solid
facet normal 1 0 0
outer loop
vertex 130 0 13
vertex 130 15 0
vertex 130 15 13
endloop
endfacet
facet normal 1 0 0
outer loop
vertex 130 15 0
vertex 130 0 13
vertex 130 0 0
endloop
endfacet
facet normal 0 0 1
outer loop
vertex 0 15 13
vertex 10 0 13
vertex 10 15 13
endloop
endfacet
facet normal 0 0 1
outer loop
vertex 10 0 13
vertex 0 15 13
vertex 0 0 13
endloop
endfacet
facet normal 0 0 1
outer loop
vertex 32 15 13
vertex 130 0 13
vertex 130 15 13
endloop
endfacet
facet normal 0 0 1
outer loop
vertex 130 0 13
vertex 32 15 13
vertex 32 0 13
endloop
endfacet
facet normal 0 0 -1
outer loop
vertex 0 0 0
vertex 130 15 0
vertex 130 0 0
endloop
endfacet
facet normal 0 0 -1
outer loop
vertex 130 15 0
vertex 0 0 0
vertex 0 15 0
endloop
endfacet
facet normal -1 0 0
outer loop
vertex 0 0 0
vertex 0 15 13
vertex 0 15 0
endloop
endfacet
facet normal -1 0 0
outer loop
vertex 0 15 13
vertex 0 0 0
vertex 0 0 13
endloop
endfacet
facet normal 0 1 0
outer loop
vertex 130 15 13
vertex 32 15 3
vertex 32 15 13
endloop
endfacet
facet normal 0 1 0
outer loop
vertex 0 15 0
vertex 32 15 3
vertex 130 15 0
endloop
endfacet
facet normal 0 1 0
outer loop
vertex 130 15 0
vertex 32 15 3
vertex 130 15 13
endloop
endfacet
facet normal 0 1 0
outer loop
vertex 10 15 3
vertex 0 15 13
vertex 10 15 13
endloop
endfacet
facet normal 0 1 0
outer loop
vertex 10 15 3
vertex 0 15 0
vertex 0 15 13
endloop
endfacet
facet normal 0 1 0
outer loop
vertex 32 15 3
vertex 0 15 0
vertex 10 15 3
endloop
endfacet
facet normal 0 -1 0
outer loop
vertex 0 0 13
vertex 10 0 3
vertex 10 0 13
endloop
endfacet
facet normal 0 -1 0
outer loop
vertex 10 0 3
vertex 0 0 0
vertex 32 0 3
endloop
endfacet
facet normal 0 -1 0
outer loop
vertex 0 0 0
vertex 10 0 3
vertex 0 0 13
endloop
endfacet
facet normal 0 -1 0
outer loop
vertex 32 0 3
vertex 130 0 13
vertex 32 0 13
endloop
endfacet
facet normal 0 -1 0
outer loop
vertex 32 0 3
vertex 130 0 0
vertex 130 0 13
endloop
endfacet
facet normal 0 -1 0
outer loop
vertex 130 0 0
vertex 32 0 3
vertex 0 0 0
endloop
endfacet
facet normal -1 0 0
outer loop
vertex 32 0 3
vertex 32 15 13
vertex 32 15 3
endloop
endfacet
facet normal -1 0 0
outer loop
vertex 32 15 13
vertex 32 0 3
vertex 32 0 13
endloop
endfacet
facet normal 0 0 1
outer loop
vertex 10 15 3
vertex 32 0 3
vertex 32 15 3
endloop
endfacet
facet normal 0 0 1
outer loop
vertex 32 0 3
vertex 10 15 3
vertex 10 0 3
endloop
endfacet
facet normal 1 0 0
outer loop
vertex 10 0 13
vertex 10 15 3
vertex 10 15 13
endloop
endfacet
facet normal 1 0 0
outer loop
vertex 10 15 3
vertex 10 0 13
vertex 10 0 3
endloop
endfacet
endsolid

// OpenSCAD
BOX_HEIGHT = 120;
LID_HEIGHT = 22;
LID_OVERHANG = 10;

FEET_OVERHANG = 10;
FEET_WIDTH = 15;

THICKNESS = 3;

difference() {
    cube([FEET_OVERHANG + BOX_HEIGHT, FEET_WIDTH, THICKNESS + LID_OVERHANG]);
    translate([FEET_OVERHANG, 0, THICKNESS]) cube([LID_HEIGHT, FEET_WIDTH, LID_OVERHANG]);
}
